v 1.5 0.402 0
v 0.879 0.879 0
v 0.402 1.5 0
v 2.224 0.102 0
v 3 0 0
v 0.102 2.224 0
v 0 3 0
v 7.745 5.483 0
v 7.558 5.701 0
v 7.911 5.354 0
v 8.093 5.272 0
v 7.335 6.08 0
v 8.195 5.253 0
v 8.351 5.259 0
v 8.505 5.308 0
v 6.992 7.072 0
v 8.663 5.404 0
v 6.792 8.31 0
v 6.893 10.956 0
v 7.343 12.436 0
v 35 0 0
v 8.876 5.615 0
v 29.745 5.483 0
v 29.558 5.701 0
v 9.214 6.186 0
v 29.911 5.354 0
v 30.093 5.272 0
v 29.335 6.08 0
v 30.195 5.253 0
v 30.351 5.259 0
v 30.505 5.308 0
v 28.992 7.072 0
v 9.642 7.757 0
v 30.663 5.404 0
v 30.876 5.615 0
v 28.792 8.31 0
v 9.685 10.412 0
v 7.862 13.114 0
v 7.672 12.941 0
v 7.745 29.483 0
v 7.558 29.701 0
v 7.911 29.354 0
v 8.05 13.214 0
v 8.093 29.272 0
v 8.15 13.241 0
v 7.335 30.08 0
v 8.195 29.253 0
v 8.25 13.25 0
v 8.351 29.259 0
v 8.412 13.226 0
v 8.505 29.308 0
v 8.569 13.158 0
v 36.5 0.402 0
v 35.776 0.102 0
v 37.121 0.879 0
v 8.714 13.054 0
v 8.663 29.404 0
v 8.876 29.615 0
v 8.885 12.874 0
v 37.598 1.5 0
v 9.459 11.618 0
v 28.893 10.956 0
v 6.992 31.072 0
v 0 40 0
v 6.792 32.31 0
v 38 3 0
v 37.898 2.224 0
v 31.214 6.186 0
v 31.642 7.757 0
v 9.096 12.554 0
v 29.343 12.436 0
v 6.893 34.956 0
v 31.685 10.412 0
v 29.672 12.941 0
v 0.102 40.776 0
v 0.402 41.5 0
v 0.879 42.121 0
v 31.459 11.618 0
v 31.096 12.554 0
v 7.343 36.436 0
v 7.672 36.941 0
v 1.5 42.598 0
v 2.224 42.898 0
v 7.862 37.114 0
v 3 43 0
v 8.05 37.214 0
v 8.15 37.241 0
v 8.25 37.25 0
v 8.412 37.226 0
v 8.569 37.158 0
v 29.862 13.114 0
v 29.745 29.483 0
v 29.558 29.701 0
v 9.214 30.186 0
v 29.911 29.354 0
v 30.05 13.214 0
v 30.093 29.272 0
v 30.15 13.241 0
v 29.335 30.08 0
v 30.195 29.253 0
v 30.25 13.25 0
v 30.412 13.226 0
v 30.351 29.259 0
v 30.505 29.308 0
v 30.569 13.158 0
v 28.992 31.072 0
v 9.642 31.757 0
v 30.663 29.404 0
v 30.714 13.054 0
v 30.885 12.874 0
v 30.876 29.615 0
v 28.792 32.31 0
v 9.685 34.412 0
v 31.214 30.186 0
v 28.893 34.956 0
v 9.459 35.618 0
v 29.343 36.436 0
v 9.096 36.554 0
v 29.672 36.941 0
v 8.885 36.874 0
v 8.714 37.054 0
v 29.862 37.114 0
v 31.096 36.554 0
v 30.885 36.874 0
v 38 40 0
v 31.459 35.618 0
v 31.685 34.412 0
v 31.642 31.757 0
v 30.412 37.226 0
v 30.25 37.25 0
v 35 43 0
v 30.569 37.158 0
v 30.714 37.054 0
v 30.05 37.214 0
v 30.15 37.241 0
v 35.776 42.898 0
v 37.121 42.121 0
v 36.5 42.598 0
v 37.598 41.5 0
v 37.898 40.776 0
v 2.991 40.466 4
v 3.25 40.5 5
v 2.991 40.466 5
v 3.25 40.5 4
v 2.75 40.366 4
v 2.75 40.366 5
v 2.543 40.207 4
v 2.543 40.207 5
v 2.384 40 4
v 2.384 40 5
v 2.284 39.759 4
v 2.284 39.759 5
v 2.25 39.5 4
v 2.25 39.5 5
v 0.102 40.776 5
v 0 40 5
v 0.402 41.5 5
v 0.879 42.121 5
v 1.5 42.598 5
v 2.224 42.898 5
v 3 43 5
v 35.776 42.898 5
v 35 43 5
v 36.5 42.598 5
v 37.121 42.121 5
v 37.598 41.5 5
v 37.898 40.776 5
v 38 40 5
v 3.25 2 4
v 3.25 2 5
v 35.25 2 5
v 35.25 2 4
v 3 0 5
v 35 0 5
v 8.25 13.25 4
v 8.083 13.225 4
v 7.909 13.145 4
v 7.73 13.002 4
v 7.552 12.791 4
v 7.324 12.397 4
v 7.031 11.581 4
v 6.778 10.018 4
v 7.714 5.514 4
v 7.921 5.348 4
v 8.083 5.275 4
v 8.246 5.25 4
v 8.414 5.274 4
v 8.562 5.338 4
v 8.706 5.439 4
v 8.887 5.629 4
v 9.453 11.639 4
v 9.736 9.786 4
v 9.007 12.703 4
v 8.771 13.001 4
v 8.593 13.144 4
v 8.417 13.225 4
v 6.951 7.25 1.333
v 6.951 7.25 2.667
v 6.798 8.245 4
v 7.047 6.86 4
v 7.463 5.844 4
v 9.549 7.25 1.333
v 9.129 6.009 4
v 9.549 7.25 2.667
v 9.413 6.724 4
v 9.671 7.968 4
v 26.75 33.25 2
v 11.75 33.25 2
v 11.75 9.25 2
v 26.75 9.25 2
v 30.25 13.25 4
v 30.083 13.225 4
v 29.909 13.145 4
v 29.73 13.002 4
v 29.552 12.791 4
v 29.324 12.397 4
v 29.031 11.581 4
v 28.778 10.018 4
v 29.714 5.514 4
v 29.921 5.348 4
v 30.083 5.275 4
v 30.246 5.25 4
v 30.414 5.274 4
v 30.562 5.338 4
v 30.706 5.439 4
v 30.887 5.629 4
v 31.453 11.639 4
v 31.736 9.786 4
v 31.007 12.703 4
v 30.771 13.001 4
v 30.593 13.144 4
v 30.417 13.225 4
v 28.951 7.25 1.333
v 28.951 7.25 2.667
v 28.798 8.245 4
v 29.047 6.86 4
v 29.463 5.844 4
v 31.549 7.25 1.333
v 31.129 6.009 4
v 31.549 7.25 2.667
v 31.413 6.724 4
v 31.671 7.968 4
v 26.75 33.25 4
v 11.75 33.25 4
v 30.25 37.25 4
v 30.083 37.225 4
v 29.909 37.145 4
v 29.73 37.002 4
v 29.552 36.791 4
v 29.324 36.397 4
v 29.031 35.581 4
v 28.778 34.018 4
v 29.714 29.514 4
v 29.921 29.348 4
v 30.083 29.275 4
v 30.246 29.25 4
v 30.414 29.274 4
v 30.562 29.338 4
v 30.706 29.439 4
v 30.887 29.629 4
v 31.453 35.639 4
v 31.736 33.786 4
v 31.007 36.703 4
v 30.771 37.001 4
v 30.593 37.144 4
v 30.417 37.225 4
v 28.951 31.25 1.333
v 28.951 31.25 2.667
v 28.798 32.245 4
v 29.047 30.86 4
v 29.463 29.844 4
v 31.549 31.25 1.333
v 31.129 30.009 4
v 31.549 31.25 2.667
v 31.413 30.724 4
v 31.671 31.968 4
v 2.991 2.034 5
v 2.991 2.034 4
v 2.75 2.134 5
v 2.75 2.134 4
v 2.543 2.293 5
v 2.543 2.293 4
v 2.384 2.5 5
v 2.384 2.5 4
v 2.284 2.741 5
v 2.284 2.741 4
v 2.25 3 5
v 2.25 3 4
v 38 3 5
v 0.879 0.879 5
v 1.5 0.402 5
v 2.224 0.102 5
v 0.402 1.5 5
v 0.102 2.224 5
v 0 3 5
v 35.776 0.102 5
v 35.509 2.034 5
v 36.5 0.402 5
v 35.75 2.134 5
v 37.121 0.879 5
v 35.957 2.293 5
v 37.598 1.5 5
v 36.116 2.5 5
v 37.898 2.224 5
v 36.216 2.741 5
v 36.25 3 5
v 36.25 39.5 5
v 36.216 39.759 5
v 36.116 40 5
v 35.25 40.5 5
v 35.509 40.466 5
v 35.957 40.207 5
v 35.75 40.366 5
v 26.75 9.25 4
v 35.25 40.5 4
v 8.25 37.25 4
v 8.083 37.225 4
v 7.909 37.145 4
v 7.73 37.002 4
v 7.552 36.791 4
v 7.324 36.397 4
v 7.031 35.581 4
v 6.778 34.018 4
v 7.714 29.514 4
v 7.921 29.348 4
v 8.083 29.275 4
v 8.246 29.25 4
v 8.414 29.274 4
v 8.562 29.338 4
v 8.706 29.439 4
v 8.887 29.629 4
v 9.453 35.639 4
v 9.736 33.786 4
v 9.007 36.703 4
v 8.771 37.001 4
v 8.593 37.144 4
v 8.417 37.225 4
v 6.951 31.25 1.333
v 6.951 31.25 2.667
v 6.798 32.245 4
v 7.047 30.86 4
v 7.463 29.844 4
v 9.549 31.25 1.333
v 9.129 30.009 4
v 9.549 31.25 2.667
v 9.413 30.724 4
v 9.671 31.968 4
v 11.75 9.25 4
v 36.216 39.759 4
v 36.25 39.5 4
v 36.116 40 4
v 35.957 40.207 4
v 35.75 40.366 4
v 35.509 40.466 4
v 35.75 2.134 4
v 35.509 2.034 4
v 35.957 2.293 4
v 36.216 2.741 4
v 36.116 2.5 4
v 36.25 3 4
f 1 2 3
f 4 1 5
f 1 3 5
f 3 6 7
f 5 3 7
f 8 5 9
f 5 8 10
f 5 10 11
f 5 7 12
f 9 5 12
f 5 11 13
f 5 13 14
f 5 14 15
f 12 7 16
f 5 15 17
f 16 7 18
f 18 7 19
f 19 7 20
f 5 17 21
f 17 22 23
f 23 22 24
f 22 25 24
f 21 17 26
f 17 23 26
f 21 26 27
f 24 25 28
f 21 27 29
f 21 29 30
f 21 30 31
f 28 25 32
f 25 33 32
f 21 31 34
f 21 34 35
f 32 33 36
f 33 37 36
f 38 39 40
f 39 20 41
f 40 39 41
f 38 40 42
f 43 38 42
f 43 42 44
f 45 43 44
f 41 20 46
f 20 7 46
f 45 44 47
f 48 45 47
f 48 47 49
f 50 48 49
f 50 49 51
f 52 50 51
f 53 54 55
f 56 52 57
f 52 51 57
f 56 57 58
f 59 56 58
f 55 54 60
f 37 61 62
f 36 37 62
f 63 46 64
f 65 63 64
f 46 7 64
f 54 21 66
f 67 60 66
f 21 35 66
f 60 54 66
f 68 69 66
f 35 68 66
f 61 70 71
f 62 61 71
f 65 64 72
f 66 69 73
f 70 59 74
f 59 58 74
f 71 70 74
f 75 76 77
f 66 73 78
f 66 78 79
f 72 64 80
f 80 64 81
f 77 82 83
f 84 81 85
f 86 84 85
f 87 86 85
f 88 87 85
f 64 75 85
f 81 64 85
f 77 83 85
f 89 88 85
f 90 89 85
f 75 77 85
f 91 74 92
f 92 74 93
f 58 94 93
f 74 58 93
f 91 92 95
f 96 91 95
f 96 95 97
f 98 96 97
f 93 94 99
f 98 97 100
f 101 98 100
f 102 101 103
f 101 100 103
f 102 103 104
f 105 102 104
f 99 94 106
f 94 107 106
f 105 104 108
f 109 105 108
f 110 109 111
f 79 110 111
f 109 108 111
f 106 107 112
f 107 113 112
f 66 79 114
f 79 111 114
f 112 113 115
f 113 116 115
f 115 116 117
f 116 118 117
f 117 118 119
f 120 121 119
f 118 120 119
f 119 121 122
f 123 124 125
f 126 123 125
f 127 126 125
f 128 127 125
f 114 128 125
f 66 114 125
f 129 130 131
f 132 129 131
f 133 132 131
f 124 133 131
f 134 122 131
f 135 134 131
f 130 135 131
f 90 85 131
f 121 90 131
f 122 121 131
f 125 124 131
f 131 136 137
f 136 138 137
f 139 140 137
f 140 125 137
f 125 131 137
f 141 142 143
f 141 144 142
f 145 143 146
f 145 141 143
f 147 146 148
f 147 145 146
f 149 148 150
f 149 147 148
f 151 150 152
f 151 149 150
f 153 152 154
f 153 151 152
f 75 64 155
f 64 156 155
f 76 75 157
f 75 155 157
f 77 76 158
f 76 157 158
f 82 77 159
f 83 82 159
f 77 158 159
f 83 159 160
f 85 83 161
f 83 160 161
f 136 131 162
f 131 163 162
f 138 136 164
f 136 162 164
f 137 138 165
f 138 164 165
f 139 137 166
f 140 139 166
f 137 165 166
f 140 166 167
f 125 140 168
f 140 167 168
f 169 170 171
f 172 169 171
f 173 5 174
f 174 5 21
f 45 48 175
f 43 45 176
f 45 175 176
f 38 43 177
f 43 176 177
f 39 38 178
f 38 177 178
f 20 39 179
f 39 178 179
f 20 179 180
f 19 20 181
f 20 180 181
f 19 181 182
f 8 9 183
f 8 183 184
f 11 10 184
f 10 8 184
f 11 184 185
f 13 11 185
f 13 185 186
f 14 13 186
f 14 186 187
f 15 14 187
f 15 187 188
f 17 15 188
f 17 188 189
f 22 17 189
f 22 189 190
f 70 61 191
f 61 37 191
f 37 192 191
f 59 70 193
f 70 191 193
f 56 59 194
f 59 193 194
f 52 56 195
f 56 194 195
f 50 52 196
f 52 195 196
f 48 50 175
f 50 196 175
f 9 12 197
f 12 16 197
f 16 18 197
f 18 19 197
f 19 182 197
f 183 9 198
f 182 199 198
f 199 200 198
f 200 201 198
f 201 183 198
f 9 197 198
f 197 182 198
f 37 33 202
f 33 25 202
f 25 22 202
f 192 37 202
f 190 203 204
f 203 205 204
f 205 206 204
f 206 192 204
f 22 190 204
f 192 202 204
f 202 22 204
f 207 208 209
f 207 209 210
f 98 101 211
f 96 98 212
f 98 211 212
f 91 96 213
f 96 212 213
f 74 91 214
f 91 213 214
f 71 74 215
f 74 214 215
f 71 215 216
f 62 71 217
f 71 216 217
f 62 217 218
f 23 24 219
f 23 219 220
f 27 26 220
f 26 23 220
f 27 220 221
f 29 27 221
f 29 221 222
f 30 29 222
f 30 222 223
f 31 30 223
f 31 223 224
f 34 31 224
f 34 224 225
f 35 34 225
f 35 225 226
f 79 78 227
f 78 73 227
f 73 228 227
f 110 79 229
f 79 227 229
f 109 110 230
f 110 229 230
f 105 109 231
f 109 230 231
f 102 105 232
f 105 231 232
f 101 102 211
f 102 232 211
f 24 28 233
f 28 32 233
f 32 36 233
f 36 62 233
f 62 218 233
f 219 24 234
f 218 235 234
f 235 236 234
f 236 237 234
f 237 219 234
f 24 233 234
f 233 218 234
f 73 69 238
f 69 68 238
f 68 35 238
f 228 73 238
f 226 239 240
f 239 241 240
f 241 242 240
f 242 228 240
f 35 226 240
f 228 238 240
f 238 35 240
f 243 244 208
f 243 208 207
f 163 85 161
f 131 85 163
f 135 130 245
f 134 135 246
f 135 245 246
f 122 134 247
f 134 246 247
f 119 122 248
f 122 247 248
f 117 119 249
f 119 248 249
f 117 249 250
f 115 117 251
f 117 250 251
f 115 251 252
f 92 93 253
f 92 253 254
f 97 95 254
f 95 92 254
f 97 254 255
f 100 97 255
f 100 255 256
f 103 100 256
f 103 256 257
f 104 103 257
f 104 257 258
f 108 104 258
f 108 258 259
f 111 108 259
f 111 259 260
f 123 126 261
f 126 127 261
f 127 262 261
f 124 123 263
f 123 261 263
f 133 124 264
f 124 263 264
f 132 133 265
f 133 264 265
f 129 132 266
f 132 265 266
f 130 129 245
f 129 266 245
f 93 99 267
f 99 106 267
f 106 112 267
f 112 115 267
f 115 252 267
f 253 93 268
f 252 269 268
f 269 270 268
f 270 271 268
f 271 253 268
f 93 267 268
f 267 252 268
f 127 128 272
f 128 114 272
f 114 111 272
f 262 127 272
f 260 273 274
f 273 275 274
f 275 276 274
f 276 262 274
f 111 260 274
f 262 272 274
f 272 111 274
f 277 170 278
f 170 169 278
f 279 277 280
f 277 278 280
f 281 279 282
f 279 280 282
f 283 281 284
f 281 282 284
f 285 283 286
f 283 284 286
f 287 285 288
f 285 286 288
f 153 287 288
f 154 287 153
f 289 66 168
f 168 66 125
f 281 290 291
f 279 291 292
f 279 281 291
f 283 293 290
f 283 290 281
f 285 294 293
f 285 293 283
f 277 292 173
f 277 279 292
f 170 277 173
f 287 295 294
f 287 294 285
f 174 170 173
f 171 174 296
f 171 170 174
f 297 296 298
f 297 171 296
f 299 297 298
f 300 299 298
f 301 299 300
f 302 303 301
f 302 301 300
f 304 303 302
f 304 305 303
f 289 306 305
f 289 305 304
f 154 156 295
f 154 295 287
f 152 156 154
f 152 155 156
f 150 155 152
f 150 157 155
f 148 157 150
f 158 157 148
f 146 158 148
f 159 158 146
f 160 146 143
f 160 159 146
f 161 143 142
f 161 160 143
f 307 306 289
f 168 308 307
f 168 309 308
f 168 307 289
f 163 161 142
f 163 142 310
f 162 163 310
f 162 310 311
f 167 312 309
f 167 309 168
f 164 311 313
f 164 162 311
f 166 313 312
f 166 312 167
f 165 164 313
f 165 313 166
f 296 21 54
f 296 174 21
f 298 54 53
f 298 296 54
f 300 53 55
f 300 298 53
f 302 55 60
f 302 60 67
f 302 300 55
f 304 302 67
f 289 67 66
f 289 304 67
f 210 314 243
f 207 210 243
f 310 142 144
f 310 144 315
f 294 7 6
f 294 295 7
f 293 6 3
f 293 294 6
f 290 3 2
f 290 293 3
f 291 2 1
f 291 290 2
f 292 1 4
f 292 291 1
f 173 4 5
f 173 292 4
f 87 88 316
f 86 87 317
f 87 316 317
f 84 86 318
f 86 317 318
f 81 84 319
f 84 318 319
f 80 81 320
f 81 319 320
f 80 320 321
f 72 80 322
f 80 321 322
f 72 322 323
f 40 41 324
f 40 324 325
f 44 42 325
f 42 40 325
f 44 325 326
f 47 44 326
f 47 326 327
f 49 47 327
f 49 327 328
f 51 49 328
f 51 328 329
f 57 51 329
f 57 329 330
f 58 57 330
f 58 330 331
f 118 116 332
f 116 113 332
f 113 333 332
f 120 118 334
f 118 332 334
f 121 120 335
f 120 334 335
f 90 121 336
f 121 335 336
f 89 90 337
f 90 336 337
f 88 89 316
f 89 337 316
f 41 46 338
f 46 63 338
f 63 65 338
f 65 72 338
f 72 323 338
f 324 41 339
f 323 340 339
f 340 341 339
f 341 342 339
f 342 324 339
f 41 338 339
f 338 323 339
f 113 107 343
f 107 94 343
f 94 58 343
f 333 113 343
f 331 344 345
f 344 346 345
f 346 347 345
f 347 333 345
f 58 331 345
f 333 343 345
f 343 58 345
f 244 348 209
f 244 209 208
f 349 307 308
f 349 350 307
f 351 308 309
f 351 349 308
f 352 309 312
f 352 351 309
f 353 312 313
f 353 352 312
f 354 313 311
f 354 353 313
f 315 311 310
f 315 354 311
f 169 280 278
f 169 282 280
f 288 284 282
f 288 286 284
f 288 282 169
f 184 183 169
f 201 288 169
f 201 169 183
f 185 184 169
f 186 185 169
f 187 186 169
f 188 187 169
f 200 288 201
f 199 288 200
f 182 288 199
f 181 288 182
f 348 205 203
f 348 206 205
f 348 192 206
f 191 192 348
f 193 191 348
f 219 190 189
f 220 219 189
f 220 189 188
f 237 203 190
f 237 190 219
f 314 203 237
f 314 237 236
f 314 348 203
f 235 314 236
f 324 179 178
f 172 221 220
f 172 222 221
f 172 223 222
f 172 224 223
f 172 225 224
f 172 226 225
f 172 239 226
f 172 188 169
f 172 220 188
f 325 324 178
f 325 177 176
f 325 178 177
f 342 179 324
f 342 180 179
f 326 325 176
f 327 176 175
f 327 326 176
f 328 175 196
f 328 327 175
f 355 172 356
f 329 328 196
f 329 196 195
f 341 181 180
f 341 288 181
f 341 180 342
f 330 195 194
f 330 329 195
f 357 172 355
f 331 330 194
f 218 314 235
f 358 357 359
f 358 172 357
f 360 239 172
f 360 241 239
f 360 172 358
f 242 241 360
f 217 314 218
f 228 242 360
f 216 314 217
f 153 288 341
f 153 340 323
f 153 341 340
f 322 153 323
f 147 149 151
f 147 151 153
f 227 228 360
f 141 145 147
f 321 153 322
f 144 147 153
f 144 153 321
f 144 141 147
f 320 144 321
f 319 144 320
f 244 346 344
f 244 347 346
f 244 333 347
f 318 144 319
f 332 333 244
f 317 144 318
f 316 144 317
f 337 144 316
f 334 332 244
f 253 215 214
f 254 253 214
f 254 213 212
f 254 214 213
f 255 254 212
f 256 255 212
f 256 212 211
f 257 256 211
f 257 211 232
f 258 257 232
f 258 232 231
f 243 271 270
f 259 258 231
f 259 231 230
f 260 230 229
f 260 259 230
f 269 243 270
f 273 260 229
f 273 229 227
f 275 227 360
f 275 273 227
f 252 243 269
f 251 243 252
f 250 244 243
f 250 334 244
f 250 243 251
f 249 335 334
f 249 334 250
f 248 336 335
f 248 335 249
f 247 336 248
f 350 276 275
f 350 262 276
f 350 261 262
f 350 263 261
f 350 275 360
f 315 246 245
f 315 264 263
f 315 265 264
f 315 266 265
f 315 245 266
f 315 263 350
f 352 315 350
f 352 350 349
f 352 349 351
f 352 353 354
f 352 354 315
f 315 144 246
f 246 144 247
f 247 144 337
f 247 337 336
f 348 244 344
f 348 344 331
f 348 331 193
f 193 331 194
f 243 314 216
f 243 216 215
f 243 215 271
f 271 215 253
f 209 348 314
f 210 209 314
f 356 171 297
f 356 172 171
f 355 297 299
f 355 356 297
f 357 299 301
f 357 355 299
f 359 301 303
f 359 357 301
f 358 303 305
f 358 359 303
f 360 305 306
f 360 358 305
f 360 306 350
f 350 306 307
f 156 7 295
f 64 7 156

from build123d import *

# Parameters (mm, degrees)
F0_W     = 38
F0_H     = 43
F1_DEPTH = 5
F2_W     = 34
F2_H     = 38.5
F3_DEPTH = 1
F5_DEPTH = 25
F6_R     = 3
F7_R     = 1
F4_W     = 15
F4_H     = 24
F8_DEPTH = 2


# Not quite as in the source:
# - a feature names something its author has since deleted; it is built from what else it names


with BuildPart() as f1:
    # F0 (on Top) → F1 (new body)
    with BuildSketch(Plane.XY):
        with Locations((19, 21.5)):
            Rectangle(F0_W, F0_H)
    extrude(amount=F1_DEPTH)

    # F2 (on face) → F3 (cut)
    with BuildSketch(Plane.XY.offset(5)):
        with Locations((19.25, 21.25)):
            Rectangle(F2_W, F2_H)
    extrude(amount=-F3_DEPTH, mode=Mode.SUBTRACT)

    # F4 (on face) → F5 (cut)
    with BuildSketch(Plane.XY.offset(4)):
        with BuildLine():
            add(Edge.make_bspline(
                [(8.25, 37.25), (5.6519237886, 37.25), (6.9509618943, 31.25), (8.25, 25.25), (9.5490381057, 31.25), (10.8480762114, 37.25), (8.25, 37.25)],
                knots=[0, 0, 0, 2.0943951024, 2.0943951024, 4.1887902048, 4.1887902048, 6.2831853072, 6.2831853072, 6.2831853072], degree=2, weights=[1, 0.5, 1, 0.5, 1, 0.5, 1]))
        make_face()
        with BuildLine():
            add(Edge.make_bspline(
                [(30.25, 37.25), (27.6519237886, 37.25), (28.9509618943, 31.25), (30.25, 25.25), (31.5490381057, 31.25), (32.8480762114, 37.25), (30.25, 37.25)],
                knots=[0, 0, 0, 2.0943951024, 2.0943951024, 4.1887902048, 4.1887902048, 6.2831853072, 6.2831853072, 6.2831853072], degree=2, weights=[1, 0.5, 1, 0.5, 1, 0.5, 1]))
        make_face()
        with BuildLine():
            add(Edge.make_bspline(
                [(30.25, 13.25), (27.6519237886, 13.25), (28.9509618943, 7.25), (30.25, 1.25), (31.5490381057, 7.25), (32.8480762114, 13.25), (30.25, 13.25)],
                knots=[0, 0, 0, 2.0943951024, 2.0943951024, 4.1887902048, 4.1887902048, 6.2831853072, 6.2831853072, 6.2831853072], degree=2, weights=[1, 0.5, 1, 0.5, 1, 0.5, 1]))
        make_face()
        with BuildLine():
            add(Edge.make_bspline(
                [(8.25, 13.25), (5.6519237886, 13.25), (6.9509618943, 7.25), (8.25, 1.25), (9.5490381057, 7.25), (10.8480762114, 13.25), (8.25, 13.25)],
                knots=[0, 0, 0, 2.0943951024, 2.0943951024, 4.1887902048, 4.1887902048, 6.2831853072, 6.2831853072, 6.2831853072], degree=2, weights=[1, 0.5, 1, 0.5, 1, 0.5, 1]))
        make_face()
    extrude(amount=-F5_DEPTH, mode=Mode.SUBTRACT)

    # F6
    f6_edges = [f1.edges().sort_by_distance(p)[0] for p in [
        (0, 0, 2.5),
        (38, 0, 2.5),
        (0, 43, 2.5),
        (38, 43, 2.5),
    ]]
    fillet(f6_edges, radius=F6_R)

    # F7
    f7_edges = [f1.edges().sort_by_distance(p)[0] for p in [
        (2.25, 2, 4.5),
        (2.25, 40.5, 4.5),
        (36.25, 2, 4.5),
        (36.25, 40.5, 4.5),
    ]]
    fillet(f7_edges, radius=F7_R)

    # F4 (on face) → F8 (cut)
    with BuildSketch(Plane.XY.offset(4)):
        with Locations((19.25, 21.25)):
            Rectangle(F4_W, F4_H)
    extrude(amount=-F8_DEPTH, mode=Mode.SUBTRACT)


solid = f1.part
